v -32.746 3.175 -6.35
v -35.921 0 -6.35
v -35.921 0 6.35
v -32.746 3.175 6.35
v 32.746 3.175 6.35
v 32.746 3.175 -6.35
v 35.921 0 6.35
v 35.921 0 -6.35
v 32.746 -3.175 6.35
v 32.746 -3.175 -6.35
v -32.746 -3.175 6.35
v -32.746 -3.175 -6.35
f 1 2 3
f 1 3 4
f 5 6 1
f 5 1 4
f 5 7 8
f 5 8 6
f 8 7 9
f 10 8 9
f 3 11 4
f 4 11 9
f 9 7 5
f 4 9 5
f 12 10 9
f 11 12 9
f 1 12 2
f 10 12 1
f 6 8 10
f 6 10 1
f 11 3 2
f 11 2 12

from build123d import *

# Parameters (mm, degrees)
F0_W             = 6.35
F0_H             = 12.7
F1_DEPTH         = 35.92068
F3_DEPTH         = 6.351
F3_DEPTH_BACK    = 6.351
F3_COPIES2_COUNT = 2


# Not quite as in the source:
# - a pattern or mirror of a feature is missing from the dataset's text; its kind, count and spacing are read off the source's solid


with BuildPart() as f1:
    # F0 (on Right) → F1 (new body, symmetric)
    with BuildSketch(Plane.YZ):
        Rectangle(F0_W, F0_H)
    extrude(amount=F1_DEPTH, both=True)

    # F2 (on Top) → F3 (cut, two sides)
    with BuildSketch(Plane.XY) as f3_sk:
        Polygon((-35.92068, 3.175), (-35.92068, 0), (-32.74568, 3.175), align=None)
    f3 = extrude(amount=-F3_DEPTH, mode=Mode.SUBTRACT) + extrude(f3_sk.sketch, amount=F3_DEPTH_BACK, mode=Mode.SUBTRACT)

    # F3_copies: F3 across plane
    add(f3.mirror(Plane(origin=(0, 0, 0), x_dir=(0, 0, -1), z_dir=(0, -1, 0))), mode=Mode.SUBTRACT)

    # F3_copies1: F3 across plane
    add(f3.mirror(Plane(origin=(0, 0, 0), x_dir=(0, 0, 1), z_dir=(1, 0, 0))), mode=Mode.SUBTRACT)

    # F3_copies2: F3 ×2 about axis
    f3_copies2_axis = Axis((0, 0, 0), (0, 0, 1))
    for i in range(1, F3_COPIES2_COUNT):
        add(f3.rotate(f3_copies2_axis, i * 360 / F3_COPIES2_COUNT), mode=Mode.SUBTRACT)


solid = f1.part
